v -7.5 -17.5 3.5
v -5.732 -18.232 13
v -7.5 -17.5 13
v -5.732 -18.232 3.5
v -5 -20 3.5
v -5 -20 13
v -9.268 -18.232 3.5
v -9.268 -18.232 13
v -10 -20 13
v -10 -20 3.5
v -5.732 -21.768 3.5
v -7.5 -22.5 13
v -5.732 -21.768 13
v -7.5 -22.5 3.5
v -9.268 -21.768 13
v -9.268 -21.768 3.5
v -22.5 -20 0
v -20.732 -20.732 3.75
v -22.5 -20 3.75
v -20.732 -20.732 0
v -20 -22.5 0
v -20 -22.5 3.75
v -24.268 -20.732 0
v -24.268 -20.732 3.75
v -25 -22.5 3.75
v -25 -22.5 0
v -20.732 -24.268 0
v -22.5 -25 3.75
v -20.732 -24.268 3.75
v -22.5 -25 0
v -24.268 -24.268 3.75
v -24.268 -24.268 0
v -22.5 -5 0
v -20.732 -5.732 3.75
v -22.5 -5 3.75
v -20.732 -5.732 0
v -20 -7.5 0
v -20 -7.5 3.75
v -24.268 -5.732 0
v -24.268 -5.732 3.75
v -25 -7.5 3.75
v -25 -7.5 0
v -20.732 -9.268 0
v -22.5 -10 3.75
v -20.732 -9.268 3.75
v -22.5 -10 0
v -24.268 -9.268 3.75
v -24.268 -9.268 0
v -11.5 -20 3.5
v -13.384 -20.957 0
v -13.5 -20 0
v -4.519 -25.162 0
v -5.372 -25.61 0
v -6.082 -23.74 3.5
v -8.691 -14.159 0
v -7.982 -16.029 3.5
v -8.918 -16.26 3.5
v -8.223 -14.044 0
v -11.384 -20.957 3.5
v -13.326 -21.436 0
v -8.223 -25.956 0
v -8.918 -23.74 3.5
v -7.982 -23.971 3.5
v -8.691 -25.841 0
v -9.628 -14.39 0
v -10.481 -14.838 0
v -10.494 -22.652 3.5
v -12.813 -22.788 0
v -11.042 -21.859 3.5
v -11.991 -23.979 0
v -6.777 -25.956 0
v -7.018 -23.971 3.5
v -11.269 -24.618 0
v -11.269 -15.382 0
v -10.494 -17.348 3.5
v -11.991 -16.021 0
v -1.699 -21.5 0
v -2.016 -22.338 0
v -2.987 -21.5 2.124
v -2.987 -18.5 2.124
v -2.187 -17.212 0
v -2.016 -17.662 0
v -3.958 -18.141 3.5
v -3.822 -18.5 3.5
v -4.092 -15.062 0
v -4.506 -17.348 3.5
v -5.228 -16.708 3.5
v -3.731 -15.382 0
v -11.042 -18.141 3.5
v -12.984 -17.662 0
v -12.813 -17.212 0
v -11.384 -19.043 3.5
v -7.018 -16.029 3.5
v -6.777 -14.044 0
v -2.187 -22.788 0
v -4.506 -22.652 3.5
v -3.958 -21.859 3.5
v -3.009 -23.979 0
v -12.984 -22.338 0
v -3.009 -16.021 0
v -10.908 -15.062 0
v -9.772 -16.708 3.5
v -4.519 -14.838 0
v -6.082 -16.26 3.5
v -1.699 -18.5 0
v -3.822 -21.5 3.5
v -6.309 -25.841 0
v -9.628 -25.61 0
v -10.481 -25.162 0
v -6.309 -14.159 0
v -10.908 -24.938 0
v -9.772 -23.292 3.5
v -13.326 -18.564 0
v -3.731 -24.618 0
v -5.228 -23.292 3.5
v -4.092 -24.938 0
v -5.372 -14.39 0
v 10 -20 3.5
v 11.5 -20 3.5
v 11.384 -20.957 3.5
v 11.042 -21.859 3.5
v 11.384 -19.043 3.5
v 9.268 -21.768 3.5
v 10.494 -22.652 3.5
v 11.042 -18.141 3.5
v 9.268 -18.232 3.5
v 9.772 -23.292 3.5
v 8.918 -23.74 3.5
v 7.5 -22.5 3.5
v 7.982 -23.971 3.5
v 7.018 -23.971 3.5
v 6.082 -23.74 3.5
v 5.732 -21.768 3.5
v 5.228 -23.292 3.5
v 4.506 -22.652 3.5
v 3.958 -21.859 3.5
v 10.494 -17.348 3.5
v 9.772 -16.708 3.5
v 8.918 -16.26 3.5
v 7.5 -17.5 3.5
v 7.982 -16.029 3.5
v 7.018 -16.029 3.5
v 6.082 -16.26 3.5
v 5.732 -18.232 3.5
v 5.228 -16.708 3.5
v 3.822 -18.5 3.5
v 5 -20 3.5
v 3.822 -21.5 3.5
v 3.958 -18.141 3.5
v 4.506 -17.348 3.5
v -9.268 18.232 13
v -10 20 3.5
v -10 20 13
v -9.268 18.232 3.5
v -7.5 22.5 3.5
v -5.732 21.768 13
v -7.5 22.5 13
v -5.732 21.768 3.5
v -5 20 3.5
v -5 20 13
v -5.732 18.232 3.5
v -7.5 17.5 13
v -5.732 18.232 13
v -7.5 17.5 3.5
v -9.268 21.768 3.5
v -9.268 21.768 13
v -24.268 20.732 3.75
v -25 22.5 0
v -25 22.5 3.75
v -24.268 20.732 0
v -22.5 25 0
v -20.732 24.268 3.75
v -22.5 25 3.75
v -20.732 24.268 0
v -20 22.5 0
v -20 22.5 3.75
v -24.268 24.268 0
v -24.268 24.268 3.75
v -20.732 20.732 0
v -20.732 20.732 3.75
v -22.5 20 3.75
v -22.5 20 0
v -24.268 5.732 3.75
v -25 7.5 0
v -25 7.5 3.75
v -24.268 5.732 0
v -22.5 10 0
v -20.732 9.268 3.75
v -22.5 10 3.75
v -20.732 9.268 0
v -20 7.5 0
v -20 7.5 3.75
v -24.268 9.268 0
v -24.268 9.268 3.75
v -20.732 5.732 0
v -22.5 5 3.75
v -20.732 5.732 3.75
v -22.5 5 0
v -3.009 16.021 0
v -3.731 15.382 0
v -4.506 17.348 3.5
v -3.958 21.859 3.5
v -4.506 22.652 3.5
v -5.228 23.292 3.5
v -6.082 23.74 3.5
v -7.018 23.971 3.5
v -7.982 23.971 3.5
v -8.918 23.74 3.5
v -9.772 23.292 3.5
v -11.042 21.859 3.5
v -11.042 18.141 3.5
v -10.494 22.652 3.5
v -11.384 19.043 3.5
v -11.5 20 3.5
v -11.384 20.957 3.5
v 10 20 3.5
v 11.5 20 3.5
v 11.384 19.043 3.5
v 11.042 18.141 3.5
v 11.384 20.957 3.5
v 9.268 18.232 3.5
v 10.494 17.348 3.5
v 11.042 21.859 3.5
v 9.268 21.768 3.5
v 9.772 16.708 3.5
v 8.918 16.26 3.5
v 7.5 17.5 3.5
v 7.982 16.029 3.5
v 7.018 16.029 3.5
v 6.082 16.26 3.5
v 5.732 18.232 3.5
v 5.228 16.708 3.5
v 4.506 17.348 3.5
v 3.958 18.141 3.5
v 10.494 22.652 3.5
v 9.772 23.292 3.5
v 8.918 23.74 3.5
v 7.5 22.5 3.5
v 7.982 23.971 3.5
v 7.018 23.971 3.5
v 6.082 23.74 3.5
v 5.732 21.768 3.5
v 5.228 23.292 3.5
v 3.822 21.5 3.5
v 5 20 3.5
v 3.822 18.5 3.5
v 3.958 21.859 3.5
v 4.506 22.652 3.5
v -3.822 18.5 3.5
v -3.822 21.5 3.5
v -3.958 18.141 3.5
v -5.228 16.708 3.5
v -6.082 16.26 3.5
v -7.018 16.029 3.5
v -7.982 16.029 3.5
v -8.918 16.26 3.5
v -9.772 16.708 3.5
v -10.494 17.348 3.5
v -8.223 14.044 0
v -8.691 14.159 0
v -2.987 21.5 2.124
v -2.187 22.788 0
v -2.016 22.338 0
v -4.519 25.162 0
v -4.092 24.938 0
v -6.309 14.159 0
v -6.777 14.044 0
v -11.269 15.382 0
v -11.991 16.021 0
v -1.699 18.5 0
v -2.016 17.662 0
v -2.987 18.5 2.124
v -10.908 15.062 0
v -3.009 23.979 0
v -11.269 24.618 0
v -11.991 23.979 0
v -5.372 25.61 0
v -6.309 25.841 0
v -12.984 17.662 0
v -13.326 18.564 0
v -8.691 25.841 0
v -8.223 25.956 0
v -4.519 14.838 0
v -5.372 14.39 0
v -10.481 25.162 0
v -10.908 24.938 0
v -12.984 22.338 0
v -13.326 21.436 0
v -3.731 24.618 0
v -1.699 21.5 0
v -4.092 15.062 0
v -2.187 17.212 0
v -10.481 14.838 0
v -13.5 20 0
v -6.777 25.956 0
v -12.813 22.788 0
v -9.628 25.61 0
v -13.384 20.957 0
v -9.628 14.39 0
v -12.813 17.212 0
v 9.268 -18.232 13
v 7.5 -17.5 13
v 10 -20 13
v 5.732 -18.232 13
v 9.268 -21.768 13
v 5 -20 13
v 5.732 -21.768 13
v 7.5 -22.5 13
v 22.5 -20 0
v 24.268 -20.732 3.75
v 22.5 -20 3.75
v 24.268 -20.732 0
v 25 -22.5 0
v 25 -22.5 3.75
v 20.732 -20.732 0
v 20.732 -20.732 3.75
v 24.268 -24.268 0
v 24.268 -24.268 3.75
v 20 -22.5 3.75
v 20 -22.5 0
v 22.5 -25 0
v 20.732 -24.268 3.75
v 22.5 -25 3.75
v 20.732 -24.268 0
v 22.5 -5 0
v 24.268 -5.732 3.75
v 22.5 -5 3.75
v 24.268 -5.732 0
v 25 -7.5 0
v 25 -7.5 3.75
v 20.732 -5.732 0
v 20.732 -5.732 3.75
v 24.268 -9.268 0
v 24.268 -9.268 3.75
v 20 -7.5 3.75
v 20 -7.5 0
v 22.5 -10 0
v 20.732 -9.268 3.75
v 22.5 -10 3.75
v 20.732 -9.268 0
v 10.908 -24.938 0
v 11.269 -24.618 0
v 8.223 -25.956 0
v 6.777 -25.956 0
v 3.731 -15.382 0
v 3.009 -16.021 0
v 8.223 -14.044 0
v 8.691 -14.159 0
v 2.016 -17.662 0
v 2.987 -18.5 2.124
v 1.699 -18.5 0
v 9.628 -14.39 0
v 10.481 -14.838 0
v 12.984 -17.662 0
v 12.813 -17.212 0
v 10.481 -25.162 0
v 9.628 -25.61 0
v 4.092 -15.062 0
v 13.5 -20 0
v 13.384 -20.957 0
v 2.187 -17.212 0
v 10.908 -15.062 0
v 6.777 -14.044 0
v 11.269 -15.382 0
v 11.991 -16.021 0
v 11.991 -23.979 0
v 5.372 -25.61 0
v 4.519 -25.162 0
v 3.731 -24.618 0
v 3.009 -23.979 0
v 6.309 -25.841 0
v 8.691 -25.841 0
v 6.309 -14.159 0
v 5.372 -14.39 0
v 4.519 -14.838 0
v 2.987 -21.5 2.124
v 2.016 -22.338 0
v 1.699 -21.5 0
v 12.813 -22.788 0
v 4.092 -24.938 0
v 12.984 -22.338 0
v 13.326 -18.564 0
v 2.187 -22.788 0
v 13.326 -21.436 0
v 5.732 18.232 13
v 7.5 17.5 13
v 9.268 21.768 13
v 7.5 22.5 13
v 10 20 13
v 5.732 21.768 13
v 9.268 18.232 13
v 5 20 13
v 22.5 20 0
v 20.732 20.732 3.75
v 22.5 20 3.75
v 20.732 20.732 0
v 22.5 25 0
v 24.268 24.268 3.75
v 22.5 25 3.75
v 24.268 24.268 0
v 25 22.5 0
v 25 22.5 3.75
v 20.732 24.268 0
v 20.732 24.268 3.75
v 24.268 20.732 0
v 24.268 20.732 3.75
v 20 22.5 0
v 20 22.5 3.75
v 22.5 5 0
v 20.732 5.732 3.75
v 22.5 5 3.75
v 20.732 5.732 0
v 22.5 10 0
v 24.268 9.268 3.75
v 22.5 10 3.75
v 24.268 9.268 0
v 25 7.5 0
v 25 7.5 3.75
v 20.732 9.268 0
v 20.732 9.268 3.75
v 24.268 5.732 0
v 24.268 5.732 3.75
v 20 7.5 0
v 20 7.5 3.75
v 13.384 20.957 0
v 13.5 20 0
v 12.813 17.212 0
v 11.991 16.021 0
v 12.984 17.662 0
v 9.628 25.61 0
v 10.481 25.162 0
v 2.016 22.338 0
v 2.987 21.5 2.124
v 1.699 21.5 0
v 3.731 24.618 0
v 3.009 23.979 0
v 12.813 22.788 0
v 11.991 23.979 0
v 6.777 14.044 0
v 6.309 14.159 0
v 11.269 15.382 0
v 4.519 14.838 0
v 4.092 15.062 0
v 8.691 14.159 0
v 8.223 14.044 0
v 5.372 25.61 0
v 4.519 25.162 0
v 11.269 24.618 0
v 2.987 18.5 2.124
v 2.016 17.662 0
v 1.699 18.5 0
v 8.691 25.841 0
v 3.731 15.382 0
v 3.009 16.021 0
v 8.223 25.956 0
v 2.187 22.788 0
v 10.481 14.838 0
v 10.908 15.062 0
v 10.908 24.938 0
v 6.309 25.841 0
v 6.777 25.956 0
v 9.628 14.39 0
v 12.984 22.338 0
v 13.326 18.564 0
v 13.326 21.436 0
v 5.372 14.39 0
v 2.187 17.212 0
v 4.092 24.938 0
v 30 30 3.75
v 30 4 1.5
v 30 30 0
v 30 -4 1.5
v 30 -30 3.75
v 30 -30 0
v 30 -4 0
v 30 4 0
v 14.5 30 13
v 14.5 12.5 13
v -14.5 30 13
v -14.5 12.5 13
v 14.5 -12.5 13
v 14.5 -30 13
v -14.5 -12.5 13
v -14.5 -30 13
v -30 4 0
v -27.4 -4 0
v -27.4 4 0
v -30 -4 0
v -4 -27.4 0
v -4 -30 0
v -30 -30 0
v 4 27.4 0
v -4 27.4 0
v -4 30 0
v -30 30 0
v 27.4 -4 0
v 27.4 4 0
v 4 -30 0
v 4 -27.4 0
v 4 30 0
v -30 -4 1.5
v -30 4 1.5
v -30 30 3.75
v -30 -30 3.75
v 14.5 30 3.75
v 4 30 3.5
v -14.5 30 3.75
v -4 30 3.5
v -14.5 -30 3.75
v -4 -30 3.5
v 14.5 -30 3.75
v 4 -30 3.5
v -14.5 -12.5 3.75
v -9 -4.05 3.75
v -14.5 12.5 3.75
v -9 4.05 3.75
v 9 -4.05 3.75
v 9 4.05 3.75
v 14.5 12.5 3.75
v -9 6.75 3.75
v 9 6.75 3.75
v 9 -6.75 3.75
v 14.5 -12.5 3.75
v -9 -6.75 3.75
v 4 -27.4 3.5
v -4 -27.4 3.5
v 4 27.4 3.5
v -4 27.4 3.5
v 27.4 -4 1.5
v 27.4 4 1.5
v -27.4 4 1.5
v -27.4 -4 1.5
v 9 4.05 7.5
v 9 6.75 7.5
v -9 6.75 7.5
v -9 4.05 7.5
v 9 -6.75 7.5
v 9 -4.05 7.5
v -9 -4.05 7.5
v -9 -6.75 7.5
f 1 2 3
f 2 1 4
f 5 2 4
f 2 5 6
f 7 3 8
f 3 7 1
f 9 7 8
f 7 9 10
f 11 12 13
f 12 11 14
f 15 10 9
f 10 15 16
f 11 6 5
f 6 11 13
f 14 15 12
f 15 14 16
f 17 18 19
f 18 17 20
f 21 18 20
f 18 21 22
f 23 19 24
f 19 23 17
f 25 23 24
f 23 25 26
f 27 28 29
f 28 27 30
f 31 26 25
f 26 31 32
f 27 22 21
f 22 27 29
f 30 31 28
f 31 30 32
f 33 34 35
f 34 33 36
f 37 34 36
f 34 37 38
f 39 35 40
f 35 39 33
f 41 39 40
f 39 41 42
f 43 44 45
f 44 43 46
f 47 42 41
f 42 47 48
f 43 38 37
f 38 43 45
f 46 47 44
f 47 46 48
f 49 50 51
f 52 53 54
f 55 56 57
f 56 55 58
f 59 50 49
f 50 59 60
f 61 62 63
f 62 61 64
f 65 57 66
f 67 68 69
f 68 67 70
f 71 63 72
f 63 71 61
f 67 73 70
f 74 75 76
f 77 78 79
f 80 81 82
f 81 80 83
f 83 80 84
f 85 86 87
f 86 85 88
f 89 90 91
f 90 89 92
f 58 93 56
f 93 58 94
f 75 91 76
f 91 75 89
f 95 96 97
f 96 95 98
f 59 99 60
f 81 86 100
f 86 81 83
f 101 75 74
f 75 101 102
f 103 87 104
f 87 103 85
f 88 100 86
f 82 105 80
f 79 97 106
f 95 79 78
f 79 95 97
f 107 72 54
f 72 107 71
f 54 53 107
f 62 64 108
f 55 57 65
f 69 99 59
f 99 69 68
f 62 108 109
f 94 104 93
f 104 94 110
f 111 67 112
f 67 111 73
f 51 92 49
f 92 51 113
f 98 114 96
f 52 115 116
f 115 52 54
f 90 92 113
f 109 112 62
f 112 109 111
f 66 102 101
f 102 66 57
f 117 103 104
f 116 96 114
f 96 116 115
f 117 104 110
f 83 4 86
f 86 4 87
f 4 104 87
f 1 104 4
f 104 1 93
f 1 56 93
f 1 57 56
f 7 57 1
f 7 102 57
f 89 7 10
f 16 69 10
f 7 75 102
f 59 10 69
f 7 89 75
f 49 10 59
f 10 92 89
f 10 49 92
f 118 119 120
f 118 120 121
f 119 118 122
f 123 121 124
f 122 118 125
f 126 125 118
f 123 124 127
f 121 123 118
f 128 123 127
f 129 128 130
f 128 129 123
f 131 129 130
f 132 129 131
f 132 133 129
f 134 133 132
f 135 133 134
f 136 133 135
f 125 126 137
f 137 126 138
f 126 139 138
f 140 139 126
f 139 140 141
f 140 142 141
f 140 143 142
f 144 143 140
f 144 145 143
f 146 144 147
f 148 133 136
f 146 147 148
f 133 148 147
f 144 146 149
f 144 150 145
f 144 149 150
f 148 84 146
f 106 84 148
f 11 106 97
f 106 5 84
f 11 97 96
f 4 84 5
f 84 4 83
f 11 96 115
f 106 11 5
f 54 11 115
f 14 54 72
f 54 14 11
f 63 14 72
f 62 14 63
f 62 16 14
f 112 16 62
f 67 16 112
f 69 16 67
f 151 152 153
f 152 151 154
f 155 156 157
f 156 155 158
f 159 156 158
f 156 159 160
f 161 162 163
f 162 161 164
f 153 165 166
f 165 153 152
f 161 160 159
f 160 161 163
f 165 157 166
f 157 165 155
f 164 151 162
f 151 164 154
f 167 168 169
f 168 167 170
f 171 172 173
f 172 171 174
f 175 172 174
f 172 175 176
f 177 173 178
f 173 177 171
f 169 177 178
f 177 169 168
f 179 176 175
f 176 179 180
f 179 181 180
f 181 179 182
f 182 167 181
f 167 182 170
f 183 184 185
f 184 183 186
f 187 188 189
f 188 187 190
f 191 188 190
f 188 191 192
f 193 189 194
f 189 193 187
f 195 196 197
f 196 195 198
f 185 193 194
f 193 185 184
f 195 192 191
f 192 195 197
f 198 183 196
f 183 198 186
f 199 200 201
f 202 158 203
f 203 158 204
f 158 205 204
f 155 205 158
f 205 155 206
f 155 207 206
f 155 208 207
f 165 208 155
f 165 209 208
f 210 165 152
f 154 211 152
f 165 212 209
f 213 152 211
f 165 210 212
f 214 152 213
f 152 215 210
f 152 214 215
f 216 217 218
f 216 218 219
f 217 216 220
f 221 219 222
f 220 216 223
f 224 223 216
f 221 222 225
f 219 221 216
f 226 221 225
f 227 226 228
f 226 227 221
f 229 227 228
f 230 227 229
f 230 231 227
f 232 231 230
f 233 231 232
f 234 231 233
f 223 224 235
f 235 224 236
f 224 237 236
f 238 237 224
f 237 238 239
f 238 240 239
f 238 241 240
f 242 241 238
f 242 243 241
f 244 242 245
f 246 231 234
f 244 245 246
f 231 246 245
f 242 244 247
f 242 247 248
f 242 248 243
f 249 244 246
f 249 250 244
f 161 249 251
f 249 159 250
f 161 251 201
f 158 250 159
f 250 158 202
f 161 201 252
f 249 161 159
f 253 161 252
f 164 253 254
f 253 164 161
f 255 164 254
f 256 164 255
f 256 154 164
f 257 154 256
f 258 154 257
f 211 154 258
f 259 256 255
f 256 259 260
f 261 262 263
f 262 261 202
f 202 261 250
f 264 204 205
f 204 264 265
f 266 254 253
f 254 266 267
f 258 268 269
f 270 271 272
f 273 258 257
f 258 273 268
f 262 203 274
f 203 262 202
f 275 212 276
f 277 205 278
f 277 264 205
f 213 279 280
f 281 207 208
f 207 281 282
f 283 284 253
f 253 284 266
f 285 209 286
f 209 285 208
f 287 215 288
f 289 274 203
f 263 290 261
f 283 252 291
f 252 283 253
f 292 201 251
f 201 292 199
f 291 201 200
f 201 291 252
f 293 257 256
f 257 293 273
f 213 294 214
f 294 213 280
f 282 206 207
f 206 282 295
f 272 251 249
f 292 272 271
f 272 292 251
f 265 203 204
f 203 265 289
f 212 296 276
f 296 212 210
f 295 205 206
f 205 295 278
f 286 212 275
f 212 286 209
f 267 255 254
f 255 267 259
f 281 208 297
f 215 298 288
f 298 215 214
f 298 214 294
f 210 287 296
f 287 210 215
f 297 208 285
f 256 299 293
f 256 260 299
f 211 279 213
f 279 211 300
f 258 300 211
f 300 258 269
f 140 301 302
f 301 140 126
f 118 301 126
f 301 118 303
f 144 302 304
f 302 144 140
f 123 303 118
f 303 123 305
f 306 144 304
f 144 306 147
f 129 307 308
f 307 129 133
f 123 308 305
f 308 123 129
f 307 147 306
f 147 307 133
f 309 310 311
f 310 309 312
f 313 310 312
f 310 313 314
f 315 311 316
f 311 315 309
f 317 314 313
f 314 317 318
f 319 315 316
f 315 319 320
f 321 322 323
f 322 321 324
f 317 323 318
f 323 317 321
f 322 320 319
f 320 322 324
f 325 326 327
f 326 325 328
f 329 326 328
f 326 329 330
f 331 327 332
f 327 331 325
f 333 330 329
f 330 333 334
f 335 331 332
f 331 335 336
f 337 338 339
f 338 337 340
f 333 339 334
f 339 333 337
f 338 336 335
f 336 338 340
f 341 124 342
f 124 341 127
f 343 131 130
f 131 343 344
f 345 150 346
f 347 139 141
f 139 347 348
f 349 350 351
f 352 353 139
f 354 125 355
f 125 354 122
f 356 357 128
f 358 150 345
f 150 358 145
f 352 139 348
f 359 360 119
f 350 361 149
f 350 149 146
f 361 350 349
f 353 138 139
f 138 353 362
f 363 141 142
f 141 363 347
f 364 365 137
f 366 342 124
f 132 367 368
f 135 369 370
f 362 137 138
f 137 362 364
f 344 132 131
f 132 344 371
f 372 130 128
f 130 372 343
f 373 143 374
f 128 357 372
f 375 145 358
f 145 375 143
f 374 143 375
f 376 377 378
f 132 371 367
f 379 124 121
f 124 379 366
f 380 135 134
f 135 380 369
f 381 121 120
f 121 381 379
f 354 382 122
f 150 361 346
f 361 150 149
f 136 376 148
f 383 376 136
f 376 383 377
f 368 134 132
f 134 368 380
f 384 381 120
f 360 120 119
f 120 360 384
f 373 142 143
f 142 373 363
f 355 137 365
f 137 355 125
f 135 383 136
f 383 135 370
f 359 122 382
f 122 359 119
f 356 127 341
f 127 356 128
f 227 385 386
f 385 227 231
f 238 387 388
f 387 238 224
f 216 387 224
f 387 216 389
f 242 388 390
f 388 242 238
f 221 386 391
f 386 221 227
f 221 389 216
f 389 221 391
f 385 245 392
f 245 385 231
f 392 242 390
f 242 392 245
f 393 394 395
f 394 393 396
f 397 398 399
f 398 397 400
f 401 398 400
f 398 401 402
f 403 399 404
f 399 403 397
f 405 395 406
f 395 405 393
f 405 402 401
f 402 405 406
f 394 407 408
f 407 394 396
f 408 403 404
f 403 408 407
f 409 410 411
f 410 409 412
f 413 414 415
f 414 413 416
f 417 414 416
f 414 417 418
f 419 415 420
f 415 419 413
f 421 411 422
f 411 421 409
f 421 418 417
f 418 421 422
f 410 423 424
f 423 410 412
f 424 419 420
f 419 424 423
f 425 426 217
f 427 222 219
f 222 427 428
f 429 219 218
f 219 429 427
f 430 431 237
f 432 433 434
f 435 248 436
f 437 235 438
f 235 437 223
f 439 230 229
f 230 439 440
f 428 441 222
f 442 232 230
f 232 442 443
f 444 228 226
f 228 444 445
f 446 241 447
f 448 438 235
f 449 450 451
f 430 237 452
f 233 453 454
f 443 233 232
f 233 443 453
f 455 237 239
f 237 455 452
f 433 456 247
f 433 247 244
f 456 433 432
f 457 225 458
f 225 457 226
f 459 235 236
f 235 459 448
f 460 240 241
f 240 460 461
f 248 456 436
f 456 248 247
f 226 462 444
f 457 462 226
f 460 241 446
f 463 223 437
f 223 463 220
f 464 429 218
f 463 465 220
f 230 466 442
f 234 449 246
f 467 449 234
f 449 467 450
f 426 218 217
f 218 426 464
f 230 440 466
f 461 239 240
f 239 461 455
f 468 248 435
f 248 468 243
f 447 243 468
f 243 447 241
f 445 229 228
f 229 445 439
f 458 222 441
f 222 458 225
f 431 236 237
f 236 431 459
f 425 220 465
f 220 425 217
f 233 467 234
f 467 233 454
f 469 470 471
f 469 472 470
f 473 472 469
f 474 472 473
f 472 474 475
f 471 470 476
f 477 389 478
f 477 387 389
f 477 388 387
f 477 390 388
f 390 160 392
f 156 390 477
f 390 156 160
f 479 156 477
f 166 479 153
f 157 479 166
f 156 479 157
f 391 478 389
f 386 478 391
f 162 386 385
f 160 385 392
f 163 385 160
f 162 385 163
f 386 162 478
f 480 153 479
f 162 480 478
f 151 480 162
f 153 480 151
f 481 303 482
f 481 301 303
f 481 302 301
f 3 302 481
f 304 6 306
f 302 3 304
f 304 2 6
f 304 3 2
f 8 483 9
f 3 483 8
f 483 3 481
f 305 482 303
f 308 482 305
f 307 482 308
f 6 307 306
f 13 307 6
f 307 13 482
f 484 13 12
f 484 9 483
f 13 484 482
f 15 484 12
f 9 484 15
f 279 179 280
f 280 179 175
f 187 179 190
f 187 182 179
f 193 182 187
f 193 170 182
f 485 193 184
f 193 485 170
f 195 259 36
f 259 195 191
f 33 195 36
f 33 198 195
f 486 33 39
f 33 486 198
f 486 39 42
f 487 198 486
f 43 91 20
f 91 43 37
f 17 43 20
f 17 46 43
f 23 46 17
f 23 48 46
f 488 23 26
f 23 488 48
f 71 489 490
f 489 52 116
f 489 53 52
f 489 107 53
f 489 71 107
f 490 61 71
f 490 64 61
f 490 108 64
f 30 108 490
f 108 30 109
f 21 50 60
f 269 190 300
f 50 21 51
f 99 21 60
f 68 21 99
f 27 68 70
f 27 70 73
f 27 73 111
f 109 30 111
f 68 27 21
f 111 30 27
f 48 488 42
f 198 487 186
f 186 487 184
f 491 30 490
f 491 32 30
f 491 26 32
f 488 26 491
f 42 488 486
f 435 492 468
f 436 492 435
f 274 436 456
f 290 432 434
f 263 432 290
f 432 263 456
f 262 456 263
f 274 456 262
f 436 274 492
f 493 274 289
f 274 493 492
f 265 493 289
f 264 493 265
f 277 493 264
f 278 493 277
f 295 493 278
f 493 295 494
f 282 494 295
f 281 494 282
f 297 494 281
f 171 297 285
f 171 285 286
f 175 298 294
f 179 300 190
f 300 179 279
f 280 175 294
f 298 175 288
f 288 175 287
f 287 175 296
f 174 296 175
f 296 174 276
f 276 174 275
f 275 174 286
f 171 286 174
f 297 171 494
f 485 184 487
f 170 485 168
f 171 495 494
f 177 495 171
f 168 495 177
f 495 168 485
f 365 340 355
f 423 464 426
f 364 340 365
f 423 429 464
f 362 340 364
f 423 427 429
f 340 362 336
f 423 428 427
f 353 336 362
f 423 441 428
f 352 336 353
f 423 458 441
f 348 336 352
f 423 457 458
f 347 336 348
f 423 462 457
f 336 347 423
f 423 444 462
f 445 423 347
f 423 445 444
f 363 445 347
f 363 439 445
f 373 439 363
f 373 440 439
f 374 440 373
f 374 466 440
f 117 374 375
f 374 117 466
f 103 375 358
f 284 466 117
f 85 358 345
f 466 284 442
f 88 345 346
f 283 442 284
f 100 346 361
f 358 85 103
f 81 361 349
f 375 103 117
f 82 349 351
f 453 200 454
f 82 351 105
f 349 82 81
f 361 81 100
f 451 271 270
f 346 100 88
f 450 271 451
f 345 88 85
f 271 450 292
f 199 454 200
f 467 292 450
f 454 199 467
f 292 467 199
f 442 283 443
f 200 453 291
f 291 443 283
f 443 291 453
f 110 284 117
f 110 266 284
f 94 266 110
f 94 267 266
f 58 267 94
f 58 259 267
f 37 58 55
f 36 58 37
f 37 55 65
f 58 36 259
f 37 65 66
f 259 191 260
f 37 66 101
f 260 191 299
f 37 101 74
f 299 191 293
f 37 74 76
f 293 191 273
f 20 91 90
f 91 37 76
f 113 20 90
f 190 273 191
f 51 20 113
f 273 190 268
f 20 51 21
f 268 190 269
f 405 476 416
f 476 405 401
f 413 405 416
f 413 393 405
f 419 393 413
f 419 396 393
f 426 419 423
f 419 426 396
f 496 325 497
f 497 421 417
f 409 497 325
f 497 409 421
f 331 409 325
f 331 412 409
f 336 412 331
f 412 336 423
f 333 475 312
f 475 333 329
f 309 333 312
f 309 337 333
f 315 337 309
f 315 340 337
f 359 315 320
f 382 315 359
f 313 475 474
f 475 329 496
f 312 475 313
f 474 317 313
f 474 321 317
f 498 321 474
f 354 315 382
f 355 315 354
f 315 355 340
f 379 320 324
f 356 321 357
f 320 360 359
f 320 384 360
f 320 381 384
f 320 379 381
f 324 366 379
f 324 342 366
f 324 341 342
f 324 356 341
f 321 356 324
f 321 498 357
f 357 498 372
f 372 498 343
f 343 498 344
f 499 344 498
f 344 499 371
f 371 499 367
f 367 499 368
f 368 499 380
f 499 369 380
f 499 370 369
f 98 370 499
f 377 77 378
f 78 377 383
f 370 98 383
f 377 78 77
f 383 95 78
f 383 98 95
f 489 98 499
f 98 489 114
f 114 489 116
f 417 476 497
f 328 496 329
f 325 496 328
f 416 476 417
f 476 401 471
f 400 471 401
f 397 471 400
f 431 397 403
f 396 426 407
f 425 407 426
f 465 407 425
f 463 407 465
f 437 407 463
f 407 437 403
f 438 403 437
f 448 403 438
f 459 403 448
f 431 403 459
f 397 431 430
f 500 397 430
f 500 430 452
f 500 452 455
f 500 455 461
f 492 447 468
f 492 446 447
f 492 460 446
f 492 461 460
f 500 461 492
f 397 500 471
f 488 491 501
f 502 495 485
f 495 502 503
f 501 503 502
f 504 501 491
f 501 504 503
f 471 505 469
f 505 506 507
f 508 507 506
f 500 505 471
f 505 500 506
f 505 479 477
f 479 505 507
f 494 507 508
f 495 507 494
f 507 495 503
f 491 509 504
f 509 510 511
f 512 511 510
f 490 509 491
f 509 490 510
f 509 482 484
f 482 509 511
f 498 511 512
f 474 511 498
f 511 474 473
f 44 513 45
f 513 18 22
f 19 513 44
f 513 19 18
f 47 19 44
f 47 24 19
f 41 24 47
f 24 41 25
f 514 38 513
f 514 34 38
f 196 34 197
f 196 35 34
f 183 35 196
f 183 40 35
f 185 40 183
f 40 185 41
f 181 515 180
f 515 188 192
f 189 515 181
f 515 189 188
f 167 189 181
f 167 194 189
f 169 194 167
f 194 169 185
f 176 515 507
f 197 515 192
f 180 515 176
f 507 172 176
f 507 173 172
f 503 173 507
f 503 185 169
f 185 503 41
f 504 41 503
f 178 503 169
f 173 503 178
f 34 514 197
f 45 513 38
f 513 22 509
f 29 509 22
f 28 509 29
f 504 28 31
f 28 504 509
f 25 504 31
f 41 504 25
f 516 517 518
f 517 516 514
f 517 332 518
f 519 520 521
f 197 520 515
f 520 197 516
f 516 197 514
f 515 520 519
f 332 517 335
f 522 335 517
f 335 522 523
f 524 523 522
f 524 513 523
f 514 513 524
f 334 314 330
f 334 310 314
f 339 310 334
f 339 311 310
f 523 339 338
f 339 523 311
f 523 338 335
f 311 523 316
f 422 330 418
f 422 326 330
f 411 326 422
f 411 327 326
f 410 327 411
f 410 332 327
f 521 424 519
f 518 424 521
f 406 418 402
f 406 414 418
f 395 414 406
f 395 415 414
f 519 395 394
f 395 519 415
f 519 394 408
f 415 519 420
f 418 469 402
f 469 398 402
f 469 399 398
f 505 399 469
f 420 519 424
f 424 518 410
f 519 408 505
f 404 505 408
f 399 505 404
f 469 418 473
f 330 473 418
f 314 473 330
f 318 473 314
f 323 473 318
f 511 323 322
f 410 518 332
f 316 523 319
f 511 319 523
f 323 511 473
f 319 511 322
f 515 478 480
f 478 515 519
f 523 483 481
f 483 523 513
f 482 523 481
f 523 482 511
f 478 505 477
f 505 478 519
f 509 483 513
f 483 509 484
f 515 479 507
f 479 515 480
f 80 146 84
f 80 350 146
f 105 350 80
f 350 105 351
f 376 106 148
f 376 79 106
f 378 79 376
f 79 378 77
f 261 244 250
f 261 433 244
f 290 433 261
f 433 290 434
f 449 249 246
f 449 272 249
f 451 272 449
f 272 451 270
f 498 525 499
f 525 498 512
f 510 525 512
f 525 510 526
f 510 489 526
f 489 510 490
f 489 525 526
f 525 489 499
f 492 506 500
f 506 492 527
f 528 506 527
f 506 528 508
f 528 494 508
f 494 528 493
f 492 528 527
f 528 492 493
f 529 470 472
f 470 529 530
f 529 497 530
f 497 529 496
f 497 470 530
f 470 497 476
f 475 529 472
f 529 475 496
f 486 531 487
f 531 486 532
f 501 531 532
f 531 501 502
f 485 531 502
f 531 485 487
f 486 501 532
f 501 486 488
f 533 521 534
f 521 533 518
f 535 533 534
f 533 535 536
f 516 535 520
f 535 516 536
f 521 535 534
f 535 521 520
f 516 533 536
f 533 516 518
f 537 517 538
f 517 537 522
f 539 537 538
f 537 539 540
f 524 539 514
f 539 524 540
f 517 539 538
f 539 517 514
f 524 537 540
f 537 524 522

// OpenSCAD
//block shape
x=60;
y=60;
z=13;
 
// track channel
f=x+10;
g=25;
h=9.5;
// block top
e=20;
r=y+10;
t=16.5;
 
// spacing of screw holes
cx=15;
cy=40;
dx=15;
dy=45;
 
difference()
{
    translate([0,0,z]/2) cube ([x,y,z],center=true);
    translate([0,0,z+4]/2) cube([f,g,h],center=true);
    translate([49,0,z+11]/2) cube ([e,r,t],center=true);
        translate([-49,0,z+11]/2) cube ([e,r,t],center=true);
   
    for(X=[-1,1], Y=[-1,1])  // Will loop through all four possibilities of X and Y
    {
        translate([X*cx,Y*cy,0]/2) cylinder(d=5, h=50,  center=true);
        translate([X*dy,Y*dy,0]/2) cylinder(d=5, h=50,  center=true);
        translate([X*dy,Y*dx,0]/2) cylinder(d=5, h=50,  center=true);
        translate([X*cx,Y*cy,0]/2)  cylinder(d1=16, d2=8, h=7,  center=true);
    }
 
// zip tie knotches    
    translate([0,-cy/2,11.5-10]) cube([18,3,4],center=true);
    translate([0,cy/2,11.5-10]) cube([18,3,4],center=true);
// removal knotches
       translate([0,-(6.8+51)/2,11.5-10]) cube([8,3,4],center=true);
   translate([0,(6.8+51)/2,11.5-10]) cube([8,3,4],center=true);
   translate([(6.8+51)/2,0,11.5-11]) cube([3,8,2],center=true);
   translate([-(6.8+51)/2,0,11.5-11]) cube([3,8,2],center=true);
}
 
translate([0,(6.8+4)/2,z-8]) cube([18,2.7,5],center=true);
translate([0,-(6.8+4)/2,z-8]) cube([18,2.7,5],center=true);
